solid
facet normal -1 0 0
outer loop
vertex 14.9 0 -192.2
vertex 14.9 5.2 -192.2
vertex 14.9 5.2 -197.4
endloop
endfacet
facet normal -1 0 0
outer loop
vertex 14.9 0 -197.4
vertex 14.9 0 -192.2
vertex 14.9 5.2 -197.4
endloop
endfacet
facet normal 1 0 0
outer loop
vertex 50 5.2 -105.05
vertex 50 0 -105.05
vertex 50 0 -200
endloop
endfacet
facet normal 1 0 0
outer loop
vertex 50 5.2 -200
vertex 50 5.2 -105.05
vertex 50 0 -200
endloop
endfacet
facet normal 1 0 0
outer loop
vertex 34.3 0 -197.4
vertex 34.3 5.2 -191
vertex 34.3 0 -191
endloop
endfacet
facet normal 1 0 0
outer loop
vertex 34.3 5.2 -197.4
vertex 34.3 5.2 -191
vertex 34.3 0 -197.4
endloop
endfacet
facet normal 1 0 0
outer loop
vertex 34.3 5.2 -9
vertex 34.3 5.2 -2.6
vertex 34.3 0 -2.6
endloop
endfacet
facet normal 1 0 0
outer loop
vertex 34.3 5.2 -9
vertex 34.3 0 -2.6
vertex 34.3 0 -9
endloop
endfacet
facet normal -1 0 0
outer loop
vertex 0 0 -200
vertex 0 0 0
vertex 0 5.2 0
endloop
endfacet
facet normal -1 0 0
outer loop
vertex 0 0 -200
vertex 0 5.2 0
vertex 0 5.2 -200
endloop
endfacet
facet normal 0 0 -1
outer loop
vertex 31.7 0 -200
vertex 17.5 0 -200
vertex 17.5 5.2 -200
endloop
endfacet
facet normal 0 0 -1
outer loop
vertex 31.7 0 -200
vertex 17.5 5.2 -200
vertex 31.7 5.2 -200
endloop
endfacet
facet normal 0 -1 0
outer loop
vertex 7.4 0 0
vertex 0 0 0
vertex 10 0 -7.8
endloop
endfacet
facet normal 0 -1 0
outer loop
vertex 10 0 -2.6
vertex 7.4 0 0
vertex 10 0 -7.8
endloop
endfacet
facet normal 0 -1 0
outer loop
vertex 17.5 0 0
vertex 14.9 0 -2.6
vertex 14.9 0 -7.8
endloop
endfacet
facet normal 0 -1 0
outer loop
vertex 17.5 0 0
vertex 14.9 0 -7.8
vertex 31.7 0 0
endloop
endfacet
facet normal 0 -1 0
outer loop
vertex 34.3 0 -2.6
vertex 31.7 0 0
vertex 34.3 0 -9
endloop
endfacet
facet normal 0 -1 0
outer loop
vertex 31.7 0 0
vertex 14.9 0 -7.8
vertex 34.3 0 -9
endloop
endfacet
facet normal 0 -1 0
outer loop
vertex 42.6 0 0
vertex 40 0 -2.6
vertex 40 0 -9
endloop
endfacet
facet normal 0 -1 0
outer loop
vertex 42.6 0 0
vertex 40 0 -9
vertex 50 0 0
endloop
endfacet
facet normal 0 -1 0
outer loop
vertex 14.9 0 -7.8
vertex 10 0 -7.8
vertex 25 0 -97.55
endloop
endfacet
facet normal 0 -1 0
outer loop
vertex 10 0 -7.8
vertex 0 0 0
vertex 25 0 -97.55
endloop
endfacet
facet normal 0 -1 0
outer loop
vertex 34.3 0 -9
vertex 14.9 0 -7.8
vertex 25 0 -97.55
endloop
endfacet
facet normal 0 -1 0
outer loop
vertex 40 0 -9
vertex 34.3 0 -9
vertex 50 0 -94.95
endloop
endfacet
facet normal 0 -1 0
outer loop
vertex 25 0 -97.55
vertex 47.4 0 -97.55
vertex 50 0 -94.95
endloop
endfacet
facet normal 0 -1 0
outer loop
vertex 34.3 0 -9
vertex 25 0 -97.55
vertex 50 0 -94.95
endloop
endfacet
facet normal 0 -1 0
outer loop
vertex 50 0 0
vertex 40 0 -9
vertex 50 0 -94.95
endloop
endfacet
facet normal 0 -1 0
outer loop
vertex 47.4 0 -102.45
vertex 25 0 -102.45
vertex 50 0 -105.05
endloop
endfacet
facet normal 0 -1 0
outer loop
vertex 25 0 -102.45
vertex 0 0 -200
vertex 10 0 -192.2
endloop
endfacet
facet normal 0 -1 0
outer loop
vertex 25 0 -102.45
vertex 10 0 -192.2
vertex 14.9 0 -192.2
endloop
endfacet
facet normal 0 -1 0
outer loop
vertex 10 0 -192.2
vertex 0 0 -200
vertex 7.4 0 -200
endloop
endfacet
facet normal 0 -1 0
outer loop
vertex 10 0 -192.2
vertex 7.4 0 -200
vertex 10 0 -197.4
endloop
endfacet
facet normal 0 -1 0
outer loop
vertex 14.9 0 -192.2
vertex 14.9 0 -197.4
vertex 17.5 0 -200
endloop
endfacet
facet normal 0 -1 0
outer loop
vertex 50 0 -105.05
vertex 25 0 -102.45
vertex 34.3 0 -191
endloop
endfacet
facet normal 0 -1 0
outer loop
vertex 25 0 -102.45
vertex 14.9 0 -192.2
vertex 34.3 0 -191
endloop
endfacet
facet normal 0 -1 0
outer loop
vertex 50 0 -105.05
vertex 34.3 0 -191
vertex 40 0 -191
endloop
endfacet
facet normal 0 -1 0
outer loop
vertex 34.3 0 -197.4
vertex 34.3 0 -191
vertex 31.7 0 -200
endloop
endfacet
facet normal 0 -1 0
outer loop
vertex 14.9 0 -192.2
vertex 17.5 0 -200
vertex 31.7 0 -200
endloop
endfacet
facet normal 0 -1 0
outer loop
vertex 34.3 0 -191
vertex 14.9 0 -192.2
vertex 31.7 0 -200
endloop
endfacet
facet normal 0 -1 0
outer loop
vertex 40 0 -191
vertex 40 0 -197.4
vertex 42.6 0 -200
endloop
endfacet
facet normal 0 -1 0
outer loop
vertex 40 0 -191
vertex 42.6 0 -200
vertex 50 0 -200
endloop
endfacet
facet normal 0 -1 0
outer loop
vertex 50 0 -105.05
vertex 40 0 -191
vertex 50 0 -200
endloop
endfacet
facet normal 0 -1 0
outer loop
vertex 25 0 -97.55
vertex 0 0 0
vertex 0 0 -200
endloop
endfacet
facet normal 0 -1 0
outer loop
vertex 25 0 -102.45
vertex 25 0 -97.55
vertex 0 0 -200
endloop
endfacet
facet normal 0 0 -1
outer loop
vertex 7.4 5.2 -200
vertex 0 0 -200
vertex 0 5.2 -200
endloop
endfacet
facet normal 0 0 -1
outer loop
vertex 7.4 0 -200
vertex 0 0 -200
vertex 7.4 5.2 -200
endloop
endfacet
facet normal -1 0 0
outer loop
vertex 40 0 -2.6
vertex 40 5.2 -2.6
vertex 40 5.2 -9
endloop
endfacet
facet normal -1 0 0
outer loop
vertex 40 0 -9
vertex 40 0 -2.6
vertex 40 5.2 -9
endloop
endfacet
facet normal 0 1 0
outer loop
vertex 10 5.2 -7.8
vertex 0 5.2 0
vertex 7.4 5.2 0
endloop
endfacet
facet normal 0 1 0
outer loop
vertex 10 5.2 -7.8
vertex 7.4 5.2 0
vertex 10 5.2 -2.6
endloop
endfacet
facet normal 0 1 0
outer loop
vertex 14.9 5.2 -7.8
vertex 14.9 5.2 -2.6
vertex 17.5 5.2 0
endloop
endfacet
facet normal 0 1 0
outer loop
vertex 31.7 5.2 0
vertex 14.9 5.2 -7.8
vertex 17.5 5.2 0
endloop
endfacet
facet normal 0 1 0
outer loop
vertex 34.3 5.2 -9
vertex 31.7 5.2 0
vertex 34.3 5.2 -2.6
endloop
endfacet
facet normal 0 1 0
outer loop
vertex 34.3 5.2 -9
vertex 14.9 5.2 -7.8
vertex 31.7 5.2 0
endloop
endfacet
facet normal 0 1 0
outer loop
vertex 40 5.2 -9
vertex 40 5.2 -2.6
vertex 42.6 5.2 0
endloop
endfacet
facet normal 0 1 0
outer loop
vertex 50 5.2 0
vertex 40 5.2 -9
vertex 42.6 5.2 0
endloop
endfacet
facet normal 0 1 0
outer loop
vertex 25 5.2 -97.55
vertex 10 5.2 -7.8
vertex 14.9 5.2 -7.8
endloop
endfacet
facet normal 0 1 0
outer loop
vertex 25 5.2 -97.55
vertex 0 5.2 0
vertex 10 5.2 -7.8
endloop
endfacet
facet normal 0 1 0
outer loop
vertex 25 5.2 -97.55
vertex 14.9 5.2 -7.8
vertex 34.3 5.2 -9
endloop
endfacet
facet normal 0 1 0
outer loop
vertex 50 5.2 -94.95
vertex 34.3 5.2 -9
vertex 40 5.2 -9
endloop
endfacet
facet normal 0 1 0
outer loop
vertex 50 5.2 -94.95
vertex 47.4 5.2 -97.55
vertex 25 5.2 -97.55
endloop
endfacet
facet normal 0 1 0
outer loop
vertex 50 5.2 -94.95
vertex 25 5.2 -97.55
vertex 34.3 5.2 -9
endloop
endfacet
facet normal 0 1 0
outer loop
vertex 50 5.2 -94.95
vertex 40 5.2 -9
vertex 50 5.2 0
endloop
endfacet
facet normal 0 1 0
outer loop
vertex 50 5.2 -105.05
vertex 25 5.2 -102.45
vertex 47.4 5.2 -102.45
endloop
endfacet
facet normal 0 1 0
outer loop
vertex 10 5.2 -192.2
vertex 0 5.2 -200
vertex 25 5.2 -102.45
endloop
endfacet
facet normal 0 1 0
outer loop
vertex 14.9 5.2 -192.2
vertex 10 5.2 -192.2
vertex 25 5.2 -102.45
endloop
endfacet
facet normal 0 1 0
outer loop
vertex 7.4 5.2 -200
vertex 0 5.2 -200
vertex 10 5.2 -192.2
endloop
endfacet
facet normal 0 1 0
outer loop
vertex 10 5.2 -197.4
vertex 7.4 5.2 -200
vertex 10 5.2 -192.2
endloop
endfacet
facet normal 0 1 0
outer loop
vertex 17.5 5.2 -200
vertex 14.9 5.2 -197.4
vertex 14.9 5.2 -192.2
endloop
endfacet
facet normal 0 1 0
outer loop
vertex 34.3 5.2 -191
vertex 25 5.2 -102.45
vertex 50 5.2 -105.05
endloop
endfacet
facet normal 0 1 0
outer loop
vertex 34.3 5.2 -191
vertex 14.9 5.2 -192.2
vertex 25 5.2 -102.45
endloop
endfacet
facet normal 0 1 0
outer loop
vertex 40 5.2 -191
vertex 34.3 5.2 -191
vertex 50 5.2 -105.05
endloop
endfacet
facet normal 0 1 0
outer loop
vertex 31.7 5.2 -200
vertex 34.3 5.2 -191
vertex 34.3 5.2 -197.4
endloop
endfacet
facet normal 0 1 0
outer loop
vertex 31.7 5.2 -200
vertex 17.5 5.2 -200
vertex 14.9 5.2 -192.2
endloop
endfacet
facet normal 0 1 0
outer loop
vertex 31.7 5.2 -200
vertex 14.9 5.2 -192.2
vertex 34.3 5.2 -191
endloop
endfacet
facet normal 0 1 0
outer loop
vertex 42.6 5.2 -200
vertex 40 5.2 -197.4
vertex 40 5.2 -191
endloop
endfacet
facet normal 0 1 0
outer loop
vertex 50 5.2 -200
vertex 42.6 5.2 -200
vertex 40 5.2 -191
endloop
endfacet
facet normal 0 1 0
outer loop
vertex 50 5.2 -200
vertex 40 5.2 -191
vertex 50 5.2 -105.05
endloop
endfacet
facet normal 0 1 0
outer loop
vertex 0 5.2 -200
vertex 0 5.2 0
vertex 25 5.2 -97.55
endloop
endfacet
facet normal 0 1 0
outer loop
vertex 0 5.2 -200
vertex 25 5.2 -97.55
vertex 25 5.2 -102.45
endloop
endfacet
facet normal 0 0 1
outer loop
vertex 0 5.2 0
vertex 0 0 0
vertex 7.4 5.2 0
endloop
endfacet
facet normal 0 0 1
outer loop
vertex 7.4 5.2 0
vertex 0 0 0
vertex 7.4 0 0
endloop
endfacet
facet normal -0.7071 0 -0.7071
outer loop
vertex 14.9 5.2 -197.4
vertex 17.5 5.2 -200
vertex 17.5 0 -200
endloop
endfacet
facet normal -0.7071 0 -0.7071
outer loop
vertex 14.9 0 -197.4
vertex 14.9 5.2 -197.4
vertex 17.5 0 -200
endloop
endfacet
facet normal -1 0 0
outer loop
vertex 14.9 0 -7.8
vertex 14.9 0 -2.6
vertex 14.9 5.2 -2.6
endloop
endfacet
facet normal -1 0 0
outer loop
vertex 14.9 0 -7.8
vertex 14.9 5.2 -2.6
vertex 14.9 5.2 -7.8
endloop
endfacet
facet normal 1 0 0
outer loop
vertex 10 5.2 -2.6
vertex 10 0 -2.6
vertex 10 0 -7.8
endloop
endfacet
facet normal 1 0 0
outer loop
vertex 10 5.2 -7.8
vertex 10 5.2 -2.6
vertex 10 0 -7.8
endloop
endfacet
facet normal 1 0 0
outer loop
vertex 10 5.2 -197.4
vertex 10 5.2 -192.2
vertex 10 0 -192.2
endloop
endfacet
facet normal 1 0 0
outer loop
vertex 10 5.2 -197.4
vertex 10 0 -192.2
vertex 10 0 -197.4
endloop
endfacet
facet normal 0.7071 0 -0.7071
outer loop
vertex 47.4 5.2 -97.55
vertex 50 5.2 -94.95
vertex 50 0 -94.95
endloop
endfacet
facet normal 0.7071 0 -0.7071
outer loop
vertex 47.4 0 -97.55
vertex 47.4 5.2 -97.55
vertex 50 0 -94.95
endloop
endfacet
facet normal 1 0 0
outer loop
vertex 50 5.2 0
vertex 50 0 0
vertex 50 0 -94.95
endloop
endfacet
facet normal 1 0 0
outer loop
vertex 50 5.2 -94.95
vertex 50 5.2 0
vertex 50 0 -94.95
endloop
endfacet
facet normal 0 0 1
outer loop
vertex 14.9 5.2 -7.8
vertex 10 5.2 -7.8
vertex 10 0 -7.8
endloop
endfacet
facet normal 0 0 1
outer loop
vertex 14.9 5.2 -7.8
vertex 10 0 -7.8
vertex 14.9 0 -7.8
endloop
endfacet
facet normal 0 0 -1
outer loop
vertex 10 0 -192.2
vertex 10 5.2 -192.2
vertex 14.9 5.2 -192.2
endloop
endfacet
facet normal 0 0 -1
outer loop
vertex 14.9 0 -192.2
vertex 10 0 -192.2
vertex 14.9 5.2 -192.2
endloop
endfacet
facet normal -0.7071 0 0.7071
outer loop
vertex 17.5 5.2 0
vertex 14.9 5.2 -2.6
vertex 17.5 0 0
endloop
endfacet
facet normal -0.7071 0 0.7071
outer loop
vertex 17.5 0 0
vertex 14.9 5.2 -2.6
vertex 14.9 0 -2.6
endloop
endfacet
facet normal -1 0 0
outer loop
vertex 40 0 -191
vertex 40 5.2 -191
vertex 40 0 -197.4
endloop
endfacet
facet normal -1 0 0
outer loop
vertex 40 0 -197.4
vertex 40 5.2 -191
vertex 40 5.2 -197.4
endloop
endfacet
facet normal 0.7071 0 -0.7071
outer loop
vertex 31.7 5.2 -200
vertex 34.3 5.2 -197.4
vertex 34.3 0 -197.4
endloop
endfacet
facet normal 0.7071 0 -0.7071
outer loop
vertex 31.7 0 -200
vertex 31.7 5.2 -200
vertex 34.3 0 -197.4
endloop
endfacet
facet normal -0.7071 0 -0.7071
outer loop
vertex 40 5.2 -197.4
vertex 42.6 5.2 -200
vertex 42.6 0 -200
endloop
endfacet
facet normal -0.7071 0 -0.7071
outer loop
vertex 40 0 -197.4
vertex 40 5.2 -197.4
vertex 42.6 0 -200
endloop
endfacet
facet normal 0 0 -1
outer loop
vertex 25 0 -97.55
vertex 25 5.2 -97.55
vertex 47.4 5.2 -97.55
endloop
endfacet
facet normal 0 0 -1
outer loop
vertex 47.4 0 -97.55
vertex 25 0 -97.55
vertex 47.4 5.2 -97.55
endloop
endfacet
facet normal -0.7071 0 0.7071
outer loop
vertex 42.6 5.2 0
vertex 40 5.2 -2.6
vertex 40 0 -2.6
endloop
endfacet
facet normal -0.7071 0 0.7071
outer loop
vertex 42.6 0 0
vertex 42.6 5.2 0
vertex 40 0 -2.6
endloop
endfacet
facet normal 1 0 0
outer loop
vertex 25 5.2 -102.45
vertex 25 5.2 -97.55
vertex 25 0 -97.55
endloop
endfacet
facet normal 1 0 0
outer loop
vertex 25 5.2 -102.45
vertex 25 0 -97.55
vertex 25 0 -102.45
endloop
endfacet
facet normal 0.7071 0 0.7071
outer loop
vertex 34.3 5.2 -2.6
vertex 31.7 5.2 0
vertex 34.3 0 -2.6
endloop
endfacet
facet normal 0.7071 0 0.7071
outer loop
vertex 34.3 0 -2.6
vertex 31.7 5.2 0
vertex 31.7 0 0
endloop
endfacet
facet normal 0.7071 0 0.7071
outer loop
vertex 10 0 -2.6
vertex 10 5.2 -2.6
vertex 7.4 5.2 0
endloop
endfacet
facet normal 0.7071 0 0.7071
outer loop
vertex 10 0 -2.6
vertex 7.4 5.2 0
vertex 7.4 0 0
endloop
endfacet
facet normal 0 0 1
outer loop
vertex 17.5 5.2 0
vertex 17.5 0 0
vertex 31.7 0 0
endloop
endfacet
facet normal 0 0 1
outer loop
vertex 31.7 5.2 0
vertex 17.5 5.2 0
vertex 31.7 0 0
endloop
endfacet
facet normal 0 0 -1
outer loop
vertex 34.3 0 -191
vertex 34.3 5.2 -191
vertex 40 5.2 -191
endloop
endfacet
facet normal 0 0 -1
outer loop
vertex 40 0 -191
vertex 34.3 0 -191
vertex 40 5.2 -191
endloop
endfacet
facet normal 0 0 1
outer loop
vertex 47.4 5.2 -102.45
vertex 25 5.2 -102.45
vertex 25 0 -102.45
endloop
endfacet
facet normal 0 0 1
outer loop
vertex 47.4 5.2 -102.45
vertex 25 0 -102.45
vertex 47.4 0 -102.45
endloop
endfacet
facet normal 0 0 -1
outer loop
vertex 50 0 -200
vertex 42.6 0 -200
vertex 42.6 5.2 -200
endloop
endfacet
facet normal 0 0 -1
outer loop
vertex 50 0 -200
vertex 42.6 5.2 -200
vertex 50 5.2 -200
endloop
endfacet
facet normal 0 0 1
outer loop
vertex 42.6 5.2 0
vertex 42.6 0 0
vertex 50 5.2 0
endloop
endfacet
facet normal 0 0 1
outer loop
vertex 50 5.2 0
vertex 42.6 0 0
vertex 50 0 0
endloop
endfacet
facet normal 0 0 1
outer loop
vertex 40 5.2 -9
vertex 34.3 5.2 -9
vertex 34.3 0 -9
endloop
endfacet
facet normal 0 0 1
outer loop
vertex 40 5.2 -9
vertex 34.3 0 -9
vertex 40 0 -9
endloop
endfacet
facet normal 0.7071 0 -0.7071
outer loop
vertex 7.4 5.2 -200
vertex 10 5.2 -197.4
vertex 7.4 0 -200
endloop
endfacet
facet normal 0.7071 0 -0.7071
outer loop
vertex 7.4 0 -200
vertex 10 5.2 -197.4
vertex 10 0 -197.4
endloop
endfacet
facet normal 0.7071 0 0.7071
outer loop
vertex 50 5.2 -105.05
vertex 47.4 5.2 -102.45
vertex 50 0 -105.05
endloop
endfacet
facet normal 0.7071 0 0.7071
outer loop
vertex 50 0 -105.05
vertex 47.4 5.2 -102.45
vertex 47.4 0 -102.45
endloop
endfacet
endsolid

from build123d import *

# Parameters (mm, degrees)
SKETCH1_W           = 50
SKETCH1_H           = 200
BOSS_EXTRUDE1_DEPTH = 5.2
SKETCH2_W           = 4.9
SKETCH2_H           = 7.8
SKETCH2_W_2         = 5.7
SKETCH2_H_2         = 9
SKETCH2_W_3         = 25
SKETCH2_H_3         = 4.9
CUT_EXTRUDE1_DEPTH  = 5.2
CHAMFER2_SIZE       = 2.6


with BuildPart() as part:
    # Sketch1 → Boss-Extrude1 (new body)
    with BuildSketch(Plane(origin=(0, 0, 0), x_dir=(1, 0, 0), z_dir=(0, 1, 0))):
        with Locations((25, 100)):
            Rectangle(SKETCH1_W, SKETCH1_H)
    extrude(amount=BOSS_EXTRUDE1_DEPTH)

    # Sketch2 → Cut-Extrude1 (cut)
    with BuildSketch(Plane(origin=(0, 5.2, 0), x_dir=(1, 0, 0), z_dir=(0, 1, 0))):
        with Locations((12.45, 196.1)):
            Rectangle(SKETCH2_W, SKETCH2_H)
        with Locations((37.15, 195.5)):
            Rectangle(SKETCH2_W_2, SKETCH2_H_2)
        with Locations((37.5, 100)):
            Rectangle(SKETCH2_W_3, SKETCH2_H_3)
        with Locations((12.45, 3.9)):
            Rectangle(SKETCH2_W, SKETCH2_H)
        with Locations((37.15, 4.5)):
            Rectangle(SKETCH2_W_2, SKETCH2_H_2)
    extrude(amount=-CUT_EXTRUDE1_DEPTH, mode=Mode.SUBTRACT)

    # Chamfer2
    chamfer2_edges = [part.edges().sort_by_distance(p)[0] for p in [
        (10, 2.6, 0),
        (14.9, 2.6, 0),
        (34.3, 2.6, 0),
        (40, 2.6, 0),
        (50, 2.6, -102.45),
        (50, 2.6, -97.55),
        (34.3, 2.6, -200),
        (40, 2.6, -200),
        (10, 2.6, -200),
        (14.9, 2.6, -200),
    ]]
    chamfer(chamfer2_edges, length=CHAMFER2_SIZE)


solid = part.part
